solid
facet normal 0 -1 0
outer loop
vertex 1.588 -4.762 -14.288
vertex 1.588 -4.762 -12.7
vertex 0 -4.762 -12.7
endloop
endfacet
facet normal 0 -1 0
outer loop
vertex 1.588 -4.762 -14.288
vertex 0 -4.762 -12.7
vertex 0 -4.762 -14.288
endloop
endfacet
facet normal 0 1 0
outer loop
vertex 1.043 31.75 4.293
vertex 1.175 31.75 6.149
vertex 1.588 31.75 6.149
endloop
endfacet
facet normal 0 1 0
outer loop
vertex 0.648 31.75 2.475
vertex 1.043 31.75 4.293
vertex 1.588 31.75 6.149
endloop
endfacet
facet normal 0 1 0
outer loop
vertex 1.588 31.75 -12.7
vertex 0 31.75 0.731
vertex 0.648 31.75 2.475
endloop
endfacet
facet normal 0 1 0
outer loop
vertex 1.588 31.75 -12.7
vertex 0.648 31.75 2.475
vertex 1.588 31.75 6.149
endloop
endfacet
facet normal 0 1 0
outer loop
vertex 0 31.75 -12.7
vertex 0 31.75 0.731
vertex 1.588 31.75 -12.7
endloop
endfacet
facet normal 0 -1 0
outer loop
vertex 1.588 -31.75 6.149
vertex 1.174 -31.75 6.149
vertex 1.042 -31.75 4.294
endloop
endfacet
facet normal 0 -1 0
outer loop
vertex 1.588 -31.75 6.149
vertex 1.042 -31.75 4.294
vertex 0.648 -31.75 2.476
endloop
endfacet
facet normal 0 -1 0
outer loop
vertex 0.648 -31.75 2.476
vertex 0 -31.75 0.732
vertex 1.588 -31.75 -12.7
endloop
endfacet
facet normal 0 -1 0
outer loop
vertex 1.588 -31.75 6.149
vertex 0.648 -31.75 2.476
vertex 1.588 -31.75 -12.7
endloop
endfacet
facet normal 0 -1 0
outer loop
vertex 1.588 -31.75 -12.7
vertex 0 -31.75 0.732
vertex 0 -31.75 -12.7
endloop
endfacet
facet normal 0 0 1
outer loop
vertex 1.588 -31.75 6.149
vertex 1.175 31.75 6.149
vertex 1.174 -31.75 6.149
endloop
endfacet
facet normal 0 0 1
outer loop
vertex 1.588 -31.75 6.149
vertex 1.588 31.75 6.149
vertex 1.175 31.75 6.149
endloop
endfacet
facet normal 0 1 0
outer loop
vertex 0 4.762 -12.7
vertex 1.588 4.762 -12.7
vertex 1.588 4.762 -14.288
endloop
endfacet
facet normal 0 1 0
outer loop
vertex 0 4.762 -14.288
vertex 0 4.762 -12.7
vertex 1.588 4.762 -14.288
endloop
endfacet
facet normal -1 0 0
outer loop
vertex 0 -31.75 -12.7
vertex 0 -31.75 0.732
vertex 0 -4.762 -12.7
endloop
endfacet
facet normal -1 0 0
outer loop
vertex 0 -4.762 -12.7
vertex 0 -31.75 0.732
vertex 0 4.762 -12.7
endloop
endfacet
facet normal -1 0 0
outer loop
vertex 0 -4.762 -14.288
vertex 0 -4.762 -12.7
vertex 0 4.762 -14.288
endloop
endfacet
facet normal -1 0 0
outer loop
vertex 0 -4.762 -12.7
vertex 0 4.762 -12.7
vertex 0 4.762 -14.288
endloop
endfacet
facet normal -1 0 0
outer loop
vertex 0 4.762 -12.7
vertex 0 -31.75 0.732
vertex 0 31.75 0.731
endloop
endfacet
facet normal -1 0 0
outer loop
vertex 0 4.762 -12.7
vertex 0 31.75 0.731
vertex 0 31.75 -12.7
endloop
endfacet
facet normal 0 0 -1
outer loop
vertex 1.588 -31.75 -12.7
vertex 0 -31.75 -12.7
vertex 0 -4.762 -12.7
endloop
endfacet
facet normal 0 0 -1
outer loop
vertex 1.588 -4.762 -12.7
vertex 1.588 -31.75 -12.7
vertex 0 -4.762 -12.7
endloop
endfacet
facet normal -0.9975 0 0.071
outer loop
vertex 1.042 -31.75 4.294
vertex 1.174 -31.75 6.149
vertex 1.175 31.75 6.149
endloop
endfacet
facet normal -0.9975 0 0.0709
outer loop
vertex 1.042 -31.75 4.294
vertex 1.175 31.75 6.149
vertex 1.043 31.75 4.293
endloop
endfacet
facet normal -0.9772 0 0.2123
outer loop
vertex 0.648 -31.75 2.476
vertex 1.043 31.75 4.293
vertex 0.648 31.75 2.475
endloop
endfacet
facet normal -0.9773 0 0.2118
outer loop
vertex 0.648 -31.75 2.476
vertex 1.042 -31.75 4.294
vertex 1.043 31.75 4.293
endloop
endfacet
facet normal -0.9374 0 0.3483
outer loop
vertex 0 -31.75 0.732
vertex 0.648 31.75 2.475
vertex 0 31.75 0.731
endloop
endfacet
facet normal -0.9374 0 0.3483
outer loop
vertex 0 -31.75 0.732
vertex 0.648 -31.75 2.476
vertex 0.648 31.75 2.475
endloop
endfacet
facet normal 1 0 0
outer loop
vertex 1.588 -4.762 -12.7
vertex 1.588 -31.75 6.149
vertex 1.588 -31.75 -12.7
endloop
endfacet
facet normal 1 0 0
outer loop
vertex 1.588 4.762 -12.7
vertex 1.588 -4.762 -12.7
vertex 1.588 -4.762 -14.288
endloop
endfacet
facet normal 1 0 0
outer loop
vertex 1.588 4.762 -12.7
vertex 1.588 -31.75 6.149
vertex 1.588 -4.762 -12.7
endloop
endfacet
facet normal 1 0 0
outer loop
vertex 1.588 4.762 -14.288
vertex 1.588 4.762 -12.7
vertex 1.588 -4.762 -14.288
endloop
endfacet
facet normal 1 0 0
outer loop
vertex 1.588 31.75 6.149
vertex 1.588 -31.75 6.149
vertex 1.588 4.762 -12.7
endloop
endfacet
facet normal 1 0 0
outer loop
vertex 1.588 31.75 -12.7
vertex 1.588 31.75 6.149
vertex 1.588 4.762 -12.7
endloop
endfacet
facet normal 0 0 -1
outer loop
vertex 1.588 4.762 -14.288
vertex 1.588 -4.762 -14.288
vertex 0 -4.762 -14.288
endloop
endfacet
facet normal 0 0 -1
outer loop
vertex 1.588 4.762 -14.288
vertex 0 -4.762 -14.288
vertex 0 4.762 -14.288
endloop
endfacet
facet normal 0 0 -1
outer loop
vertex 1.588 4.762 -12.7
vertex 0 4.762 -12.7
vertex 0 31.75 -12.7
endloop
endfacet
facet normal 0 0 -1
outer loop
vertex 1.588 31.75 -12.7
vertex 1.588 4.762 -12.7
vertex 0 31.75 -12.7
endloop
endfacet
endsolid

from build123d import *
from OCP.BRepAlgoAPI import BRepAlgoAPI_Cut
from OCP.TopTools import TopTools_ListOfShape

# Parameters (mm, degrees)
SKETCH2_W           = 25.4
SKETCH2_H           = 63.5
BOSS_EXTRUDE1_DEPTH = 1.5875
SKETCH3_W           = 1.5875
SKETCH3_H           = 9.525
BOSS_EXTRUDE2_DEPTH = 1.5875
SKETCH3_4_W         = 1.5875
SKETCH3_4_H         = 9.525
CUT_EXTRUDE1_DEPTH  = 3.175
CUT_EXTRUDE2_DEPTH  = 35.85276621
CAVITY1_START       = -31.74999873
CAVITY1_DEPTH       = 63.499999998


with BuildPart() as part:
    # Sketch2 → Boss-Extrude1 (new body)
    with BuildSketch(Plane(origin=(0, 0, 0), x_dir=(0, 0, -1), z_dir=(1, 0, 0))):
        Rectangle(SKETCH2_W, SKETCH2_H)
    extrude(amount=BOSS_EXTRUDE1_DEPTH)

    # Sketch3 → Boss-Extrude2 (add)
    with BuildSketch(Plane(origin=(1.5875, 0, 0), x_dir=(0, 0, -1), z_dir=(1, 0, 0))):
        with Locations((13.49375, 0)):
            Rectangle(SKETCH3_W, SKETCH3_H)
    extrude(amount=-BOSS_EXTRUDE2_DEPTH)

    # Sketch3<4> → Cut-Extrude1 (cut)
    with BuildSketch(Plane(origin=(1.5875, 0, 0), x_dir=(0, 0, -1), z_dir=(1, 0, 0))):
        with Locations((-11.90625, 0)):
            Rectangle(SKETCH3_4_W, SKETCH3_4_H)
    extrude(amount=-CUT_EXTRUDE1_DEPTH, mode=Mode.SUBTRACT)

    # Sketch4 → Cut-Extrude2 (cut, through all)
    with BuildSketch(Plane(origin=(1.5875, 0, 0), x_dir=(0, 0, -1), z_dir=(1, 0, 0))):
        Polygon((-6.14934, 31.75), (-6.14934, -31.75), (-12.7, -31.75), (-12.7, -4.7625), (-11.1125, -4.7625), (-11.1125, 4.7625), (-12.7, 4.7625), (-12.7, 31.75), align=None)
    extrude(amount=-CUT_EXTRUDE2_DEPTH, mode=Mode.SUBTRACT)


with BuildPart() as cavity1_tool:
    # Cavity1: read off the stored shape, not the designer's step
    # Cavity1 outline → Cavity1 (new body)
    with BuildSketch(Plane(origin=(0, 0, 0), x_dir=(0.9999999999641164, -8.471563968881495e-06, 0), z_dir=(8.471563968881494e-06, 0.9999999999641164, 0)).offset(CAVITY1_START)):
        with BuildLine():
            Line((-2, -6.14934), (1.17475, -6.14934))
            ThreePointArc((1.17475, -6.14934), (0.877620674, -3.377118582), (-0.000268972, -0.730836814))
            Line((-0.000268972, -0.730836814), (-0.787986067, 1))
            Line((-0.787986067, 1), (-2, 1))
            Line((-2, 1), (-2, -6.14934))
        make_face()
    extrude(amount=CAVITY1_DEPTH)


with BuildPart() as part_1:
    add(part.part)

    # Cavity1: cut by cavity1_tool, with a tolerance
    cavity1_stock = TopTools_ListOfShape()
    cavity1_stock.Append(part_1.part.wrapped)
    cavity1_tools = TopTools_ListOfShape()
    cavity1_tools.Append(cavity1_tool.part.wrapped)
    cavity1_cut = BRepAlgoAPI_Cut()
    cavity1_cut.SetArguments(cavity1_stock)
    cavity1_cut.SetTools(cavity1_tools)
    cavity1_cut.SetFuzzyValue(0.00001)
    cavity1_cut.Build()
    add(Compound.cast(cavity1_cut.Shape()).solids(), mode=Mode.REPLACE)


solid = part_1.part
